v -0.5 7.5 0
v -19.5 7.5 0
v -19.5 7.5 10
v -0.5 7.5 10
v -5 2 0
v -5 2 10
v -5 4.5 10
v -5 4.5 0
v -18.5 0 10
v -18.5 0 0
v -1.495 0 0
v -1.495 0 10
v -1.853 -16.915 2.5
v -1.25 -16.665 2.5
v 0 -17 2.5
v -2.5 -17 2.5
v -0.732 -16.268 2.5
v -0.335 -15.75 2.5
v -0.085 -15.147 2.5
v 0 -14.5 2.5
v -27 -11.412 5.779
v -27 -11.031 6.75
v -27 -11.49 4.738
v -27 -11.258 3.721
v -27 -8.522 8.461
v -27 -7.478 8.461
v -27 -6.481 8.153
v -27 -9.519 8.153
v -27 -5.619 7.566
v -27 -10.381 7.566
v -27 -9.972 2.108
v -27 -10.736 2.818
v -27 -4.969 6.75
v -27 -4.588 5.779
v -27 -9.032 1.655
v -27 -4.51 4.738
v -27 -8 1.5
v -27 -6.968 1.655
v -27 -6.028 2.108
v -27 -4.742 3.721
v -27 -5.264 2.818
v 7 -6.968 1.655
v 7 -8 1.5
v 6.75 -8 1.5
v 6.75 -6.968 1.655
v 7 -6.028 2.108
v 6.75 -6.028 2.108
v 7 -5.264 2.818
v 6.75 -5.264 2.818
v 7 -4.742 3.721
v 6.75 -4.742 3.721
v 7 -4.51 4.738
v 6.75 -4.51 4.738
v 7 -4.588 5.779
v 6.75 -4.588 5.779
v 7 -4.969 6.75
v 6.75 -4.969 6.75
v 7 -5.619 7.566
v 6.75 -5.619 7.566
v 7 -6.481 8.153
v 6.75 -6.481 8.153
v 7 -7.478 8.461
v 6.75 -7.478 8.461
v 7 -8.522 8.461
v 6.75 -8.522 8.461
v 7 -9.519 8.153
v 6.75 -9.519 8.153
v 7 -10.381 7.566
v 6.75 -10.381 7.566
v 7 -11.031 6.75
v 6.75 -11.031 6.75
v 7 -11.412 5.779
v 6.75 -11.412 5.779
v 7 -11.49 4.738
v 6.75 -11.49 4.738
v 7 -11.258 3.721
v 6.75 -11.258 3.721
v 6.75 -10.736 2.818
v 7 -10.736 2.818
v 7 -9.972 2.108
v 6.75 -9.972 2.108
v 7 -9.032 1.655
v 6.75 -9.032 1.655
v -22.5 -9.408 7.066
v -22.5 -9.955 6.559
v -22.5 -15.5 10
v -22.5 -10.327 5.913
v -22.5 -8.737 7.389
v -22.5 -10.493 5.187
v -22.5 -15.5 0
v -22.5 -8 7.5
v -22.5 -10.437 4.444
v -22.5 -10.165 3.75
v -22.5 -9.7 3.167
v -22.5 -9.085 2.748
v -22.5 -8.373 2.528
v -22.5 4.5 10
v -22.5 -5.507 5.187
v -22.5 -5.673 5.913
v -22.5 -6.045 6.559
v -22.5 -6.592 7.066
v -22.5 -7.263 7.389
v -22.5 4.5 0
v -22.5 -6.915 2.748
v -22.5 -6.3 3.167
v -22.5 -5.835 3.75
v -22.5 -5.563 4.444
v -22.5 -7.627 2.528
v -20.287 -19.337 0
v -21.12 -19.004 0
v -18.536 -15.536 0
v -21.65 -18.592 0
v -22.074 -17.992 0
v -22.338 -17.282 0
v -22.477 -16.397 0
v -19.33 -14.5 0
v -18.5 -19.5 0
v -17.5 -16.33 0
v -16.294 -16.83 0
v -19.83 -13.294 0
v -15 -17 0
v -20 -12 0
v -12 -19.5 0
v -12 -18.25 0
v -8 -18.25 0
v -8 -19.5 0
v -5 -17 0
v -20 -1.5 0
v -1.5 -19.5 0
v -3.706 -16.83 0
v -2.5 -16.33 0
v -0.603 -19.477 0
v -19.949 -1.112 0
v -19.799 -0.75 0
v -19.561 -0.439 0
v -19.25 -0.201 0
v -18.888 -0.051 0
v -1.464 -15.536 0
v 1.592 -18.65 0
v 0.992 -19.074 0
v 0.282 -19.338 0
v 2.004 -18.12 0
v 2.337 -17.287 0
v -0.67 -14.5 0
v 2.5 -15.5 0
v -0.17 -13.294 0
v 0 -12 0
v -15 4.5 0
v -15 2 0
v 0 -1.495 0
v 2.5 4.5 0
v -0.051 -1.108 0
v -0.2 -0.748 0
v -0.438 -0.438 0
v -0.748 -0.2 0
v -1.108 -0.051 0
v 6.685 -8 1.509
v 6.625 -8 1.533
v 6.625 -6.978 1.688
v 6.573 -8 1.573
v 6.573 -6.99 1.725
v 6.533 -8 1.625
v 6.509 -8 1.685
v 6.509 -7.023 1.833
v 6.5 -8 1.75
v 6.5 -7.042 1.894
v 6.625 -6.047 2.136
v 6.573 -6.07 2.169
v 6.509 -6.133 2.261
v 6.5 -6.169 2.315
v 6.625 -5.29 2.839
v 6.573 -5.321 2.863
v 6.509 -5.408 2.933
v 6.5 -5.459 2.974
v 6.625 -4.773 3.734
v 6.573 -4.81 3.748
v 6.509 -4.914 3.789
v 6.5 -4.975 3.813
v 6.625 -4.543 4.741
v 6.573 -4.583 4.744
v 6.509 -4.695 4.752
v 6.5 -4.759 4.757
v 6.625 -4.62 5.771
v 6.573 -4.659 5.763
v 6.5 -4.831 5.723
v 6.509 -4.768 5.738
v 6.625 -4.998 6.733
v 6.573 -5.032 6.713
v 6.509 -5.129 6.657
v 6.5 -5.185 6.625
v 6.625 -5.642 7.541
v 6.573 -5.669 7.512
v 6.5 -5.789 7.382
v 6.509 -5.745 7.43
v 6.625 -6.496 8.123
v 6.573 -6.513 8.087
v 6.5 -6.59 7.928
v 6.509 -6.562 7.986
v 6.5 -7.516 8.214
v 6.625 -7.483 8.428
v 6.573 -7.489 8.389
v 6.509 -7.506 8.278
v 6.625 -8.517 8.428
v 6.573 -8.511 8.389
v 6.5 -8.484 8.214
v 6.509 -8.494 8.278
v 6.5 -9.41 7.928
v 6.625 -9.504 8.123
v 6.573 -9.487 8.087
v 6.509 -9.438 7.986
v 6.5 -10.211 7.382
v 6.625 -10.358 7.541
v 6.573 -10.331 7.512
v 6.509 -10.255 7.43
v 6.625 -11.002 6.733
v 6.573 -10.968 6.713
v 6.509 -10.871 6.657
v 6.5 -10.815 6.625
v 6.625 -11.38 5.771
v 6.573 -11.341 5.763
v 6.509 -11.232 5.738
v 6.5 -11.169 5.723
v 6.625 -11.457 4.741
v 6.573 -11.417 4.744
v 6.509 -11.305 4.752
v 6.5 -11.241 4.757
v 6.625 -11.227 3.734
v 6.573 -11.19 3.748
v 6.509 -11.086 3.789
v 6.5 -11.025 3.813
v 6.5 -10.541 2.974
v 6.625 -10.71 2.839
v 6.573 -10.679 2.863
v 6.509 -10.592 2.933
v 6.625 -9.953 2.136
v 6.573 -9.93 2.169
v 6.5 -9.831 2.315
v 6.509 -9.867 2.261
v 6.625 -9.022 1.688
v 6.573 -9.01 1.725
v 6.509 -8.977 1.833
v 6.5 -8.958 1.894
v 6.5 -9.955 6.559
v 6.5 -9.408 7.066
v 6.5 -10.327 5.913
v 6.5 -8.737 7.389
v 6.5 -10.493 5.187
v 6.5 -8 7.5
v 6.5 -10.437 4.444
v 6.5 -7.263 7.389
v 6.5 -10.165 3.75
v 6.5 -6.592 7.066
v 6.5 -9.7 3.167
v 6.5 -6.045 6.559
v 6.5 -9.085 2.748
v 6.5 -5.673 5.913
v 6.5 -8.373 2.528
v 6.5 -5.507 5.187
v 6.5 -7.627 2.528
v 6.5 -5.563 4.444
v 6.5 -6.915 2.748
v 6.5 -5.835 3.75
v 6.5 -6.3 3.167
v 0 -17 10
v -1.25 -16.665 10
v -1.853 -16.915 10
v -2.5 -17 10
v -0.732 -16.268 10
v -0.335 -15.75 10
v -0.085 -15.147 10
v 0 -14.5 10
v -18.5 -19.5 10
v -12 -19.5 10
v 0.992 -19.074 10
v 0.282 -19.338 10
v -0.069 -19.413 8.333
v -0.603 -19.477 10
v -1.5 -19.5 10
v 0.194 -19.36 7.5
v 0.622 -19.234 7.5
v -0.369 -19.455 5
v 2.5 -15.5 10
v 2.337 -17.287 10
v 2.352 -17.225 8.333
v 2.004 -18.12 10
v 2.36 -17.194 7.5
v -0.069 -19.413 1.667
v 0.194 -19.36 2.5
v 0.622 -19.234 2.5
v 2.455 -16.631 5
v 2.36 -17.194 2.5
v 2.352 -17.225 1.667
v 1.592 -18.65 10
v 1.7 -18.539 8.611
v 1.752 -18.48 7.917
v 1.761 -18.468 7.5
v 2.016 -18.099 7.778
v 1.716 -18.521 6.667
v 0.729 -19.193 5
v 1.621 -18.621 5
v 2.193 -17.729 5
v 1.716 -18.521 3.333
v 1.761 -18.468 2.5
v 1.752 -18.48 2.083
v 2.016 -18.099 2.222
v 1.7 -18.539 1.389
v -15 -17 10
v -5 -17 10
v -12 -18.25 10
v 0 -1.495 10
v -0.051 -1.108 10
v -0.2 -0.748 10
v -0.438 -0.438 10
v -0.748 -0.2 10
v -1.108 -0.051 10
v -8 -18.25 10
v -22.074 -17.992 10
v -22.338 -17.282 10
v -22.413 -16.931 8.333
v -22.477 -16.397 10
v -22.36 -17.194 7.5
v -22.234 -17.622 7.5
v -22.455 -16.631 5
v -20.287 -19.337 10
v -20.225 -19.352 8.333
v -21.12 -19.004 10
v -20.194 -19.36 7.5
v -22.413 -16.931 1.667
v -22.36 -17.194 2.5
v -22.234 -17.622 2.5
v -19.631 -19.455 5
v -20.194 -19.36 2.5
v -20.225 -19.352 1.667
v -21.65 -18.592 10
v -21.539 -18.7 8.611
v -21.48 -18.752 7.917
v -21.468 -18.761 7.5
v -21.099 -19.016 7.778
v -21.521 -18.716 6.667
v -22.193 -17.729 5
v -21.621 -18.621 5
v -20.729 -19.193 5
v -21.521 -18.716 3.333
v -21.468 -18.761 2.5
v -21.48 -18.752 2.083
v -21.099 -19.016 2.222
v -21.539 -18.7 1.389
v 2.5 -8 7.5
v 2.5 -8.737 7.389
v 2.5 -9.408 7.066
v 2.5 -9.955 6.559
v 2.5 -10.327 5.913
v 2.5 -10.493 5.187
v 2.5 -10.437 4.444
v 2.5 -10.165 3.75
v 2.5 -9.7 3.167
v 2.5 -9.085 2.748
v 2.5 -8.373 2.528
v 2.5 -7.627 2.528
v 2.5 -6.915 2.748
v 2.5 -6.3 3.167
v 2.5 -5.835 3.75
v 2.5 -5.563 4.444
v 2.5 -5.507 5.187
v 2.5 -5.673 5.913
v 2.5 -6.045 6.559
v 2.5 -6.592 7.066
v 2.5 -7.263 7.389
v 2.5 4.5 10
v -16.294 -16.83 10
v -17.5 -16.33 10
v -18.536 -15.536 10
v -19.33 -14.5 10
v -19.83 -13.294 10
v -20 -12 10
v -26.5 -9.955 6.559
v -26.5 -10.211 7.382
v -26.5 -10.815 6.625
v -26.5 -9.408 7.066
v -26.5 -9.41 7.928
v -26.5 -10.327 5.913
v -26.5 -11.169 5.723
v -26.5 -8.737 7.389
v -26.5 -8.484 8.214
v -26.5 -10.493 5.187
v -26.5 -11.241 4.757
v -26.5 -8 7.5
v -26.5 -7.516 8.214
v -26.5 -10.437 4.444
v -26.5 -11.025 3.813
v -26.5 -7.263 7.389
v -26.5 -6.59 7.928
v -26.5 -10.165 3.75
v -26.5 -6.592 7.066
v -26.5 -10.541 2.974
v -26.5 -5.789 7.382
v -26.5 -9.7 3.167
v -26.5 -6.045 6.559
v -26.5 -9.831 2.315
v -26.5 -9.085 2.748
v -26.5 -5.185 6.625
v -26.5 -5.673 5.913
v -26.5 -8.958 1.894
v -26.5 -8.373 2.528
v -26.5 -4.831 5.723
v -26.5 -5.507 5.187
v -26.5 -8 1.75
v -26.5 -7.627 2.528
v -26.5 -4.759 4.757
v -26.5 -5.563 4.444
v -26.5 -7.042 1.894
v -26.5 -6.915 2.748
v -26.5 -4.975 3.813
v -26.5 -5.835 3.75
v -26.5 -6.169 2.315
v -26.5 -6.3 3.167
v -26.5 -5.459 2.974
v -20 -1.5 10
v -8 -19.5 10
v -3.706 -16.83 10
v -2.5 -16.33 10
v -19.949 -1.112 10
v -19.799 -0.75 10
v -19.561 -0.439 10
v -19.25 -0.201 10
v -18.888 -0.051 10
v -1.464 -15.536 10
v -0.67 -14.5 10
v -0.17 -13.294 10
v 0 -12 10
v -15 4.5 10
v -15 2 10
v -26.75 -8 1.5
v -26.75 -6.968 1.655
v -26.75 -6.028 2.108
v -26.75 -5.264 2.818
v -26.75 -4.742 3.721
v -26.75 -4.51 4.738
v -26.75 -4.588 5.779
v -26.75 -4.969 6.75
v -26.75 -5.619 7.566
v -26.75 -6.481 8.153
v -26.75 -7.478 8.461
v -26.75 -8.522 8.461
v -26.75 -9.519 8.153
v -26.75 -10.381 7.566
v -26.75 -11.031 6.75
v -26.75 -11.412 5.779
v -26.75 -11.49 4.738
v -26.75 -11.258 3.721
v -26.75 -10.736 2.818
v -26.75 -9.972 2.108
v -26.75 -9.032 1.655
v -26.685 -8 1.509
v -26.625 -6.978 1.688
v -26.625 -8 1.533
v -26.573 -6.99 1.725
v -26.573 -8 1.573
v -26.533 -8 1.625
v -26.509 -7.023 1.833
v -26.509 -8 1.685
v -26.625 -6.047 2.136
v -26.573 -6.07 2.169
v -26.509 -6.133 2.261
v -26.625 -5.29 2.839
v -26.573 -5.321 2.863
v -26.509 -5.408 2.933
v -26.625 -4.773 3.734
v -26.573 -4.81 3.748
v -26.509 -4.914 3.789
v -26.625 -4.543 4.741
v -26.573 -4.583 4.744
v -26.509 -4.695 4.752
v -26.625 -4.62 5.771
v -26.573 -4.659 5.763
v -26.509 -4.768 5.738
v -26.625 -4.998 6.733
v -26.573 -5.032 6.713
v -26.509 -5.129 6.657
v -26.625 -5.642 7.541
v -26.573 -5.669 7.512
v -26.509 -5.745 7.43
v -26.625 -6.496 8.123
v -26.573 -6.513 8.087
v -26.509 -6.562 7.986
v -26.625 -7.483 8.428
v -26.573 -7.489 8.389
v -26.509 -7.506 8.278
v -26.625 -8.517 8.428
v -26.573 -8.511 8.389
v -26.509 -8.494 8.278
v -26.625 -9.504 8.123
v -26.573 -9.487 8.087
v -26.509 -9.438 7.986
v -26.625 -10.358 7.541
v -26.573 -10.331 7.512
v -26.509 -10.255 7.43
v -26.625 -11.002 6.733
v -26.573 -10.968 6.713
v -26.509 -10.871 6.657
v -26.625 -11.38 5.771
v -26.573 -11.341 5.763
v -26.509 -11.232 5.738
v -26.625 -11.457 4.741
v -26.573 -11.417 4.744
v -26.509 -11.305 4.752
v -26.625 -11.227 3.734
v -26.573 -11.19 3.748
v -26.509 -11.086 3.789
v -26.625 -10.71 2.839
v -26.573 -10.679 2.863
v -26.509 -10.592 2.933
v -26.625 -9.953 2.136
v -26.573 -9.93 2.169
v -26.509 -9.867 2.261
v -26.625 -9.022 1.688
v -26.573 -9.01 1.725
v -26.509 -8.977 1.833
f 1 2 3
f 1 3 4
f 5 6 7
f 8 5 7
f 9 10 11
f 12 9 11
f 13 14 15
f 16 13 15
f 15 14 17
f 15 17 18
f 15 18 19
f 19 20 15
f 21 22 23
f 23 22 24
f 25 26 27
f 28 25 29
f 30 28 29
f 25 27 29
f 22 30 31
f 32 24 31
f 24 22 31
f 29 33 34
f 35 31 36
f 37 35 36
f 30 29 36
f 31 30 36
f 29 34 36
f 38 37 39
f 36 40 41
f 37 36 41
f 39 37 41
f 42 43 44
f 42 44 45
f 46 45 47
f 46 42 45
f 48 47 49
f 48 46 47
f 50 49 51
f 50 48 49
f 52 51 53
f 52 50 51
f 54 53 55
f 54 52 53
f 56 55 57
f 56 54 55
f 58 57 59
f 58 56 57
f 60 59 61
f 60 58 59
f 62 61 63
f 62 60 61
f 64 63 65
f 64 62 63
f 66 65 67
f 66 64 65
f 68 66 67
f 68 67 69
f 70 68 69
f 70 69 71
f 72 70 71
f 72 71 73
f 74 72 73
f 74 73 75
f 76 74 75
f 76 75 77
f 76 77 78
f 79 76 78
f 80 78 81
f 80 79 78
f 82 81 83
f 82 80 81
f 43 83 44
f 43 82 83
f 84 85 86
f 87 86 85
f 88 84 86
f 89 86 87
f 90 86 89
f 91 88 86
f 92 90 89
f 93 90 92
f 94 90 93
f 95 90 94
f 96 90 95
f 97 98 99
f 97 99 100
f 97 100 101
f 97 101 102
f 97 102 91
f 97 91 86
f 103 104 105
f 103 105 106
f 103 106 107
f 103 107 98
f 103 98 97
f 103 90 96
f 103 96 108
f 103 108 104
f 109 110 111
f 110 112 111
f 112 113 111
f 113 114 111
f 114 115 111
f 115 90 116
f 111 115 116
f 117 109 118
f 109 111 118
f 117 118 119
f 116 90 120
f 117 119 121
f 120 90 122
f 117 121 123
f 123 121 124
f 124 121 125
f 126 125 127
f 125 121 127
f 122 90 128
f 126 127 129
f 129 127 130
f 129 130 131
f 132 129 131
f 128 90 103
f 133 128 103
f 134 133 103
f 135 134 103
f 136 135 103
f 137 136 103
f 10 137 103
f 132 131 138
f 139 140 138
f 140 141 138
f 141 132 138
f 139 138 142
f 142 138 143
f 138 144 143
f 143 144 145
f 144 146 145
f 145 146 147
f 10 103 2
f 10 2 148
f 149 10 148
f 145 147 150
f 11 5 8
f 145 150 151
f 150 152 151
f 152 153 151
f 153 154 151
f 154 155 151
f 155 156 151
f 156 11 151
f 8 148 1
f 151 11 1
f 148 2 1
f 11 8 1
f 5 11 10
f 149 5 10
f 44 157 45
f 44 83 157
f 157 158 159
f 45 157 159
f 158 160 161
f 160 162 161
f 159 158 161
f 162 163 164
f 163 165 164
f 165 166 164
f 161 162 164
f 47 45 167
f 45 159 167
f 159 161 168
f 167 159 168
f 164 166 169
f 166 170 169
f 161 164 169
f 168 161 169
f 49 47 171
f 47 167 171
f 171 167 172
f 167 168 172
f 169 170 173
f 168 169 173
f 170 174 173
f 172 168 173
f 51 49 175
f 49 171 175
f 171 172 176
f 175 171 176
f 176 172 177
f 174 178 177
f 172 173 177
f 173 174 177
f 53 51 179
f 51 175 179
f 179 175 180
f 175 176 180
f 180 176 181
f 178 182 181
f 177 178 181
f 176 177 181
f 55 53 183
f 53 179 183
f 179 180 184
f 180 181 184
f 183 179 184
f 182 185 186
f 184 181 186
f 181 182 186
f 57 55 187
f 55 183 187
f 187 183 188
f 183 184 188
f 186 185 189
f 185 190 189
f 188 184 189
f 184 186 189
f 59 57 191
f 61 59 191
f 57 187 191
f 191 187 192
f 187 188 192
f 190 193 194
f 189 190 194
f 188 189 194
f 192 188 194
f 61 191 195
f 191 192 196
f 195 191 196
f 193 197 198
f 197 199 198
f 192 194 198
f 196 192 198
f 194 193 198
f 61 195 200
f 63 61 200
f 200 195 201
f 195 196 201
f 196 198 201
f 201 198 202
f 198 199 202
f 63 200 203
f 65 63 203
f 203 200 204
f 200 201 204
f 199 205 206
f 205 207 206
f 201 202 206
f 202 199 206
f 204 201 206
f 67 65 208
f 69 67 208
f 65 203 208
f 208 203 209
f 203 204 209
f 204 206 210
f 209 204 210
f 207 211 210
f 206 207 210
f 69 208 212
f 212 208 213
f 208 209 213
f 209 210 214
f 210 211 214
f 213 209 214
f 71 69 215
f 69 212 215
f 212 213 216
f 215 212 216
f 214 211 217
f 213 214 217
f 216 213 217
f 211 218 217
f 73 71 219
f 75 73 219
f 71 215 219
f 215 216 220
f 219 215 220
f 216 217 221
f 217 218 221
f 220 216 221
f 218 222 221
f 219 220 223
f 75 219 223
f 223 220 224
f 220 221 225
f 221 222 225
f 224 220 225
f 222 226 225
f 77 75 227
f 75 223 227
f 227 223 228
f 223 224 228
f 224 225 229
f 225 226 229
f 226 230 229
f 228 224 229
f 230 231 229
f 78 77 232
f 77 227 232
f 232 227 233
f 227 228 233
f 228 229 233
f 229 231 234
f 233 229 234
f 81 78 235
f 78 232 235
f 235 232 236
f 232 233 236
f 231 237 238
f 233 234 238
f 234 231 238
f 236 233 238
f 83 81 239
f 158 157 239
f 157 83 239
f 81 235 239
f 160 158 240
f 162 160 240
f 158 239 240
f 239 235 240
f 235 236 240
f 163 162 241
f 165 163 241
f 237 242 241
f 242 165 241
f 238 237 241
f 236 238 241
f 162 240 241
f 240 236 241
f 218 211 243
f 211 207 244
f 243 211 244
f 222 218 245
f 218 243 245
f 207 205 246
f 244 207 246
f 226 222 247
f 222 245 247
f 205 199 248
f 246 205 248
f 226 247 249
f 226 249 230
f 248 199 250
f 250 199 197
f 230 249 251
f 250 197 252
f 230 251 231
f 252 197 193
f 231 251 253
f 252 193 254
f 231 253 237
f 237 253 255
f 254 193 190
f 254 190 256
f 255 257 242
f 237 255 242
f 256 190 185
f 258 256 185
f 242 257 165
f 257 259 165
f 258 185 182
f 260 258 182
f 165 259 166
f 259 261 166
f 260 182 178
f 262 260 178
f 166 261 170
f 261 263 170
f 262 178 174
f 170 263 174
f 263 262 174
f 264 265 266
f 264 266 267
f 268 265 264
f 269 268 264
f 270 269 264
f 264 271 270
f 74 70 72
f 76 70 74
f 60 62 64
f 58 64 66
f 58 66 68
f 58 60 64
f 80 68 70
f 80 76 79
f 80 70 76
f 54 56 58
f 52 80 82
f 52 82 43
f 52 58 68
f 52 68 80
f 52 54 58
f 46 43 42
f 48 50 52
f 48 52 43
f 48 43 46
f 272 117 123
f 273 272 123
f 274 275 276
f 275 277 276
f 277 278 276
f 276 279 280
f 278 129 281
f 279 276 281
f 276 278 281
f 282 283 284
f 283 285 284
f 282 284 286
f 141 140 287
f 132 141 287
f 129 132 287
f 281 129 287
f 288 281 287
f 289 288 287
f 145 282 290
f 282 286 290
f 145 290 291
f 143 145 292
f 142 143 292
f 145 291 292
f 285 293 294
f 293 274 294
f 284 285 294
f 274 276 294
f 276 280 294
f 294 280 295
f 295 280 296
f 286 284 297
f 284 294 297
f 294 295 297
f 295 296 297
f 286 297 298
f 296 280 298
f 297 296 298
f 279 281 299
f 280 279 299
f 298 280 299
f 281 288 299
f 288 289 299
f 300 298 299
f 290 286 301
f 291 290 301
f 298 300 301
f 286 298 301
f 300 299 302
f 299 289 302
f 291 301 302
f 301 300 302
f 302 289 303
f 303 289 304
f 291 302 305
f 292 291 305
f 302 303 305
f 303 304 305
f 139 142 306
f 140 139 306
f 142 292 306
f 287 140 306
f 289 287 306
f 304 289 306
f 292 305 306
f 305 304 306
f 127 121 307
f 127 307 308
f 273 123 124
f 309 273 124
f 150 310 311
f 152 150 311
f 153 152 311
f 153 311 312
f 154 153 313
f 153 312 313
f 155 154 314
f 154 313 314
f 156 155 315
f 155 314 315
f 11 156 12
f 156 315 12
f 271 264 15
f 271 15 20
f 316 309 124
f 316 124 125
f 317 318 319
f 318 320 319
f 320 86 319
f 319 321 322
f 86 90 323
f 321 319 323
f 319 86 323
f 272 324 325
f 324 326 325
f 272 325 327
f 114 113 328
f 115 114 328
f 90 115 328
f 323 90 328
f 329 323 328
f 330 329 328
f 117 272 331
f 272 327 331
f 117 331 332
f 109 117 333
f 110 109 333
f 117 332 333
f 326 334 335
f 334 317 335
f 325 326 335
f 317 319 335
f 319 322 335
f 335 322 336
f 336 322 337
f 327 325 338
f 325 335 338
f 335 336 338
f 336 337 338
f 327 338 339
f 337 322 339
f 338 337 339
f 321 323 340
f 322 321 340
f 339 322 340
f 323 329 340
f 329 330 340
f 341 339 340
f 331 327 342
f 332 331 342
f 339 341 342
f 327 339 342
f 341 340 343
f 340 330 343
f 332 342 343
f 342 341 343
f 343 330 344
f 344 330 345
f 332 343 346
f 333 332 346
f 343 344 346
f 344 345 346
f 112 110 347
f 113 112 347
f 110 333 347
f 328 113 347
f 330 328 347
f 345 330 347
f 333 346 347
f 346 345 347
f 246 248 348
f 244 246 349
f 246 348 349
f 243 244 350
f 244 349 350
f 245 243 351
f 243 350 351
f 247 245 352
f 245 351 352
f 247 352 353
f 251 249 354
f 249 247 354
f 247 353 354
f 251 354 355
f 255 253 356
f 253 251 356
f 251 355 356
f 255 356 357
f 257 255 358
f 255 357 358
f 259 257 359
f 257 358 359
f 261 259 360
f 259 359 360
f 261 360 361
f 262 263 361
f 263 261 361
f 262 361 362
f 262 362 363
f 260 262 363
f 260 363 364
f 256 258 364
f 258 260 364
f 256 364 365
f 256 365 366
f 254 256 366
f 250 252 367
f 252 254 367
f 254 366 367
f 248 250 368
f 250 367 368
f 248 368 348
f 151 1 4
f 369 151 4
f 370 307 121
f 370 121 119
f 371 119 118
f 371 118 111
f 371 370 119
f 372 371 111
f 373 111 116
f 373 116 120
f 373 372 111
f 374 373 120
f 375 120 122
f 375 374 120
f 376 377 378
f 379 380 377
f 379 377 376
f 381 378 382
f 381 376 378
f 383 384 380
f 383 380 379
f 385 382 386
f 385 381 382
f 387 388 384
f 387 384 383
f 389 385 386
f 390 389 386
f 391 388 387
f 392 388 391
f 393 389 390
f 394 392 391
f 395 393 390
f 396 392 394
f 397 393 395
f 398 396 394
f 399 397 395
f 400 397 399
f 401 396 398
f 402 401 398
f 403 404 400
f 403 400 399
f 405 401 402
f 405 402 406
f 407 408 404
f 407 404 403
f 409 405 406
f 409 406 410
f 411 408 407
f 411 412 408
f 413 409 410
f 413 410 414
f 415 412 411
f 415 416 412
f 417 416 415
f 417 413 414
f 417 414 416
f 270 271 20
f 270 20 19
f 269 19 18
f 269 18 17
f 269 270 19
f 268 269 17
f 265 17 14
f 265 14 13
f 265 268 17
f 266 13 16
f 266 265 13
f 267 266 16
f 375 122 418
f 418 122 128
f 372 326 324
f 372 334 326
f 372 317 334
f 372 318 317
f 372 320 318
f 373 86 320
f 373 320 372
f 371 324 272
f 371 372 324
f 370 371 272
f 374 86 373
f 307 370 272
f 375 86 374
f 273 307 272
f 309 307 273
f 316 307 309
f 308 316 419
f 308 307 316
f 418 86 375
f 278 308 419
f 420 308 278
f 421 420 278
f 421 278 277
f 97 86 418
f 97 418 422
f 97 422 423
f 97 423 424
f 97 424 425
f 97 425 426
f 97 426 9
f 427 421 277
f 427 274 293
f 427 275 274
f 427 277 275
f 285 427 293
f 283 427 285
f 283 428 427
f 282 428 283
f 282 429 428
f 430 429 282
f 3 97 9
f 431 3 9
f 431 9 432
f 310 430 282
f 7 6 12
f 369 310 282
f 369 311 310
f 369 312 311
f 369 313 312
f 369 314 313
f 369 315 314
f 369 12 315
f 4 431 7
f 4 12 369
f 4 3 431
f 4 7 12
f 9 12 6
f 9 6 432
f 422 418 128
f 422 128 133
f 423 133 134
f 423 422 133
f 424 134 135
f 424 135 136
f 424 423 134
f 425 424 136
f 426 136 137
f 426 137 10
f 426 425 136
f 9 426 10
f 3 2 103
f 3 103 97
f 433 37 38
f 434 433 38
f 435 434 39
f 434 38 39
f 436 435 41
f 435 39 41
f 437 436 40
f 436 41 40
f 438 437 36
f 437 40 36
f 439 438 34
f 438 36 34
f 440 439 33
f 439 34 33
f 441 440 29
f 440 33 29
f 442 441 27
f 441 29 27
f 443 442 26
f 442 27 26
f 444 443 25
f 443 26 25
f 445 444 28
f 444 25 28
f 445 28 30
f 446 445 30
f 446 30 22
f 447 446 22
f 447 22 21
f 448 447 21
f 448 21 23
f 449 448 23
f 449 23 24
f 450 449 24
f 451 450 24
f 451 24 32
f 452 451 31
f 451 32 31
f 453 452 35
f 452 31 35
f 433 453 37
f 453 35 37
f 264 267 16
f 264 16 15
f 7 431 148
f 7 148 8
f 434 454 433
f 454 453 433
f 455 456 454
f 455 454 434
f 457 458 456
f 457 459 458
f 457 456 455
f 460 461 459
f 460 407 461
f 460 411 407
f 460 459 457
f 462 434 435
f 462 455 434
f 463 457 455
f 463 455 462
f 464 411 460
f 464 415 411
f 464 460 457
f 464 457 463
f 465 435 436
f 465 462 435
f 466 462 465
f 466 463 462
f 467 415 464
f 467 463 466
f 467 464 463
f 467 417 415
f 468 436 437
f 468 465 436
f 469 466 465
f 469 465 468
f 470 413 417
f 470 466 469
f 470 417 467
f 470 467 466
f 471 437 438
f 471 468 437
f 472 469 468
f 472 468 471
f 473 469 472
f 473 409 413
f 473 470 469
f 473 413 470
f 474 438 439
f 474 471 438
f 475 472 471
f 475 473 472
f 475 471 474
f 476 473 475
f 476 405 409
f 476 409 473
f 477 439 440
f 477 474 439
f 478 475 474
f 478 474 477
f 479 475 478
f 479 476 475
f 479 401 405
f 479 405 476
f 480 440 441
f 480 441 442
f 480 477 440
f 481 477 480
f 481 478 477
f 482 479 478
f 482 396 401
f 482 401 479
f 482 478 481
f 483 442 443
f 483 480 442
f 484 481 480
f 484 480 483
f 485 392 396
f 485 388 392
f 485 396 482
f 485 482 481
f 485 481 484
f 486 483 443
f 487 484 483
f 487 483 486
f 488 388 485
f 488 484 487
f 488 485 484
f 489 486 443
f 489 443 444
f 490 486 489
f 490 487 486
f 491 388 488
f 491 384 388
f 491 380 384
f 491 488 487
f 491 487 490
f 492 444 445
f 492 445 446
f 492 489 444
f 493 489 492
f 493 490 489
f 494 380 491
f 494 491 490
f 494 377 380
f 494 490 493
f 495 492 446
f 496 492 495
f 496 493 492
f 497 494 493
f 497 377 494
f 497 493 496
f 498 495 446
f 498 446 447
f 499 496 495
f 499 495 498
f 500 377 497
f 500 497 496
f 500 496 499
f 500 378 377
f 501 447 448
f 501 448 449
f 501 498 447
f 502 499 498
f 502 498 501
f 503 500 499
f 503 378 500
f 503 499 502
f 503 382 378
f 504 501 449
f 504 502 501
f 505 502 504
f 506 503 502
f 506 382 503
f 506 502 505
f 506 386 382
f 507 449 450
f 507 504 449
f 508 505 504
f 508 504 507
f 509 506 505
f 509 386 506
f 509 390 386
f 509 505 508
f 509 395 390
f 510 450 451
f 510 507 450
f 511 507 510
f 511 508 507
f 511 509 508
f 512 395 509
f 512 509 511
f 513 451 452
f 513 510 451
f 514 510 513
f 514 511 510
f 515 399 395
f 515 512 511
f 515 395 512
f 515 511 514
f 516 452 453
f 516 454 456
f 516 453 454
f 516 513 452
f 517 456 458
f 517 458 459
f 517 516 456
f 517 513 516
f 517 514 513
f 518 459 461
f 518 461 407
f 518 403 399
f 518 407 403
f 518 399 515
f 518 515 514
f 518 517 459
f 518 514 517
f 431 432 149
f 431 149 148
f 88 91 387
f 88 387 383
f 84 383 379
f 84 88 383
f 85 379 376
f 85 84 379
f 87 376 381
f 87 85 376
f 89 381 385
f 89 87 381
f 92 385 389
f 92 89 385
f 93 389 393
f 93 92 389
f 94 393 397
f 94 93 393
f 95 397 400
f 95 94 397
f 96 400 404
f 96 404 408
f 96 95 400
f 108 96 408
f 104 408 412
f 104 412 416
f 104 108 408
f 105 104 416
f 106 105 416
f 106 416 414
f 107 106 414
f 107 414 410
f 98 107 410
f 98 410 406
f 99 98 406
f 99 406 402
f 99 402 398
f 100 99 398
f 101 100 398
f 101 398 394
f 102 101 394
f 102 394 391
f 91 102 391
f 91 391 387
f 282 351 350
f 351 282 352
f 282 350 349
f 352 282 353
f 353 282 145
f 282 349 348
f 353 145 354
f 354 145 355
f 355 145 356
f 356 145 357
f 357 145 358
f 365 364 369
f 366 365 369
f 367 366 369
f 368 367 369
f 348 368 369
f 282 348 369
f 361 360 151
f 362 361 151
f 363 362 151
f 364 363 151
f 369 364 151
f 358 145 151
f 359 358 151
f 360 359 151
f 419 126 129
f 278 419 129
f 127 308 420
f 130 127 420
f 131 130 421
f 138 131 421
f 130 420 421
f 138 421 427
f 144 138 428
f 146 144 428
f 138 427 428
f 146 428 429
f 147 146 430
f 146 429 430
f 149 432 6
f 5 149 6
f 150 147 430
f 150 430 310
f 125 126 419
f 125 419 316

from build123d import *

# Parameters (mm, degrees)
SKETCH1_W            = 25
SKETCH1_H            = 27
SKETCH1_W_2          = 20
SKETCH1_H_2          = 17
BOSS_EXTRUDE1_DEPTH  = 10
FILLET1_SIZE         = 4
BOSS_EXTRUDE2_DEPTH  = 10
BOSS_EXTRUDE3_DEPTH  = 10
BOSS_EXTRUDE4_DEPTH  = 7.5
BOSS_EXTRUDE5_DEPTH  = 10
CHAMFER1_SIZE        = 3
SKETCH8_W            = 10
SKETCH8_H            = 2.5
CUT_EXTRUDE1_DEPTH   = 10.5
SKETCH19_W           = 4
SKETCH19_H           = 1.25
CUT_EXTRUDE5_DEPTH   = 32.408597715
SKETCH20_R           = 2.5
BOSS_EXTRUDE10_DEPTH = 4.5
SKETCH21_R           = 3.5
BOSS_EXTRUDE11_DEPTH = 0.5
FILLET2_R            = 0.25
FILLET3_R            = 0.25


with BuildPart() as part:
    # Sketch1 → Boss-Extrude1 (new body)
    with BuildSketch(Plane.XY):
        with Locations((-10, -6)):
            Rectangle(SKETCH1_W, SKETCH1_H)
        with Locations((-10, -8.5)):
            Rectangle(SKETCH1_W_2, SKETCH1_H_2, mode=Mode.SUBTRACT)
    extrude(amount=BOSS_EXTRUDE1_DEPTH)

    # Fillet1
    # a fillet whose section is not a circle: 4 mm, written as the material it takes off along each edge
    with BuildSketch(Plane(origin=(-22.5, -19.5, -10), x_dir=(0, 1, 0), z_dir=(0, 0, 1)), Plane(origin=(2.5, -19.5, -10), x_dir=(-1, 0, 0), z_dir=(0, 0, 1))) as fillet1_piece_1:
        with BuildLine():
            add(Edge.make_bspline([(FILLET1_SIZE, 0), (FILLET1_SIZE * 0.831801948466, 0), (FILLET1_SIZE * 0.663603896932, 0), (FILLET1_SIZE * 0.292893218813, -FILLET1_SIZE * 0.0716919198361), (FILLET1_SIZE * 0.0716919198361, -FILLET1_SIZE * 0.292893218813), (0, -FILLET1_SIZE * 0.663603896932), (0, -FILLET1_SIZE * 0.831801948466), (0, -FILLET1_SIZE)], knots=[0, 0, 0, 0, 0, 0, 0.5, 0.5, 1, 1, 1, 1, 1, 1], degree=5))
            Line((0, -FILLET1_SIZE), (0, 0))
            Line((0, 0), (FILLET1_SIZE, 0))
        make_face()
    extrude(amount=30, mode=Mode.SUBTRACT)

    # Sketch3 → Boss-Extrude2 (add)
    with BuildSketch(Plane.XY.offset(10)):
        with BuildLine():
            Line((-18.5, 0), (-20, 0))
            Line((-20, 0), (-20, -1.5))
            ThreePointArc((-20, -1.5), (-19.560660172, -0.439339828), (-18.5, 0))
        make_face()
    extrude(amount=-BOSS_EXTRUDE2_DEPTH)

    # Sketch4 → Boss-Extrude3 (add)
    with BuildSketch(Plane.XY.offset(10)):
        with BuildLine():
            Line((0, 0), (0, -1.495394009))
            ThreePointArc((0, -1.495394009), (-0.437990765, -0.437990765), (-1.495394009, 0))
            Line((-1.495394009, 0), (0, 0))
        make_face()
    extrude(amount=-BOSS_EXTRUDE3_DEPTH)

    # Sketch7 → Boss-Extrude5 (add)
    with BuildSketch(Plane.XY.offset(10)):
        with BuildLine():
            Line((-20, -17), (-15, -17))
            ThreePointArc((-15, -17), (-18.535533906, -15.535533906), (-20, -12))
            Line((-20, -12), (-20, -17))
        make_face()
        with BuildLine():
            Line((0, -17), (-5, -17))
            ThreePointArc((-5, -17), (-1.464466094, -15.535533906), (0, -12))
            Line((0, -12), (0, -17))
        make_face()
    extrude(amount=-BOSS_EXTRUDE5_DEPTH)

    # Chamfer1
    chamfer1_edges = [part.edges().sort_by_distance(p)[0] for p in [
        (2.5, 7.5, 5),
        (-22.5, 7.5, 5),
    ]]
    chamfer(chamfer1_edges, length=CHAMFER1_SIZE)

    # Sketch8 → Cut-Extrude1 (cut)
    with BuildSketch(Plane.XY.offset(10)):
        with Locations((-10, 3.25)):
            Rectangle(SKETCH8_W, SKETCH8_H)
    extrude(amount=-CUT_EXTRUDE1_DEPTH, mode=Mode.SUBTRACT)

    # Sketch19 → Cut-Extrude5 (cut, through all)
    with BuildSketch(Plane.XY.offset(10)):
        with Locations((-10, -18.875)):
            Rectangle(SKETCH19_W, SKETCH19_H)
    extrude(amount=-CUT_EXTRUDE5_DEPTH, mode=Mode.SUBTRACT)

    # Sketch20 → Boss-Extrude10 (add)
    with BuildSketch(Plane(origin=(2.5, 0, 0), x_dir=(0, 0, -1), z_dir=(1, 0, 0))):
        with Locations(Location((-5, -8, 0), (0, 0, 180))):
            Circle(SKETCH20_R)
    boss_extrude10 = extrude(amount=BOSS_EXTRUDE10_DEPTH)

    # Sketch21 → Boss-Extrude11 (add)
    with BuildSketch(Plane(origin=(7, 0, 0), x_dir=(0, 0, -1), z_dir=(1, 0, 0))):
        with Locations((-5, -8)):
            Circle(SKETCH21_R)
    boss_extrude11 = extrude(amount=-BOSS_EXTRUDE11_DEPTH)

    # Fillet2
    fillet2_edges = [part.edges().sort_by_distance(p)[0] for p in [
        (6.5, -8, 8.5),
    ]]
    fillet(fillet2_edges, radius=FILLET2_R)

    # Mirror1: Boss-Extrude10, Boss-Extrude11 across plane
    add(boss_extrude10.mirror(Plane.ZY.offset(10)))
    add(boss_extrude11.mirror(Plane.ZY.offset(10)))

    # Fillet3
    fillet3_edges = [part.edges().sort_by_distance(p)[0] for p in [
        (-26.5, -8, 8.5),
    ]]
    fillet(fillet3_edges, radius=FILLET3_R)


with BuildPart() as body_2:
    # Sketch6 → Boss-Extrude4 (new body)
    with BuildSketch(Plane.XY.offset(10)):
        with BuildLine():
            Line((0, -17), (0, -14.5))
            ThreePointArc((0, -14.5), (-0.732233047, -16.267766953), (-2.5, -17))
            Line((-2.5, -17), (0, -17))
        make_face()
    extrude(amount=-BOSS_EXTRUDE4_DEPTH)


solid = Compound([part.part, body_2.part])
